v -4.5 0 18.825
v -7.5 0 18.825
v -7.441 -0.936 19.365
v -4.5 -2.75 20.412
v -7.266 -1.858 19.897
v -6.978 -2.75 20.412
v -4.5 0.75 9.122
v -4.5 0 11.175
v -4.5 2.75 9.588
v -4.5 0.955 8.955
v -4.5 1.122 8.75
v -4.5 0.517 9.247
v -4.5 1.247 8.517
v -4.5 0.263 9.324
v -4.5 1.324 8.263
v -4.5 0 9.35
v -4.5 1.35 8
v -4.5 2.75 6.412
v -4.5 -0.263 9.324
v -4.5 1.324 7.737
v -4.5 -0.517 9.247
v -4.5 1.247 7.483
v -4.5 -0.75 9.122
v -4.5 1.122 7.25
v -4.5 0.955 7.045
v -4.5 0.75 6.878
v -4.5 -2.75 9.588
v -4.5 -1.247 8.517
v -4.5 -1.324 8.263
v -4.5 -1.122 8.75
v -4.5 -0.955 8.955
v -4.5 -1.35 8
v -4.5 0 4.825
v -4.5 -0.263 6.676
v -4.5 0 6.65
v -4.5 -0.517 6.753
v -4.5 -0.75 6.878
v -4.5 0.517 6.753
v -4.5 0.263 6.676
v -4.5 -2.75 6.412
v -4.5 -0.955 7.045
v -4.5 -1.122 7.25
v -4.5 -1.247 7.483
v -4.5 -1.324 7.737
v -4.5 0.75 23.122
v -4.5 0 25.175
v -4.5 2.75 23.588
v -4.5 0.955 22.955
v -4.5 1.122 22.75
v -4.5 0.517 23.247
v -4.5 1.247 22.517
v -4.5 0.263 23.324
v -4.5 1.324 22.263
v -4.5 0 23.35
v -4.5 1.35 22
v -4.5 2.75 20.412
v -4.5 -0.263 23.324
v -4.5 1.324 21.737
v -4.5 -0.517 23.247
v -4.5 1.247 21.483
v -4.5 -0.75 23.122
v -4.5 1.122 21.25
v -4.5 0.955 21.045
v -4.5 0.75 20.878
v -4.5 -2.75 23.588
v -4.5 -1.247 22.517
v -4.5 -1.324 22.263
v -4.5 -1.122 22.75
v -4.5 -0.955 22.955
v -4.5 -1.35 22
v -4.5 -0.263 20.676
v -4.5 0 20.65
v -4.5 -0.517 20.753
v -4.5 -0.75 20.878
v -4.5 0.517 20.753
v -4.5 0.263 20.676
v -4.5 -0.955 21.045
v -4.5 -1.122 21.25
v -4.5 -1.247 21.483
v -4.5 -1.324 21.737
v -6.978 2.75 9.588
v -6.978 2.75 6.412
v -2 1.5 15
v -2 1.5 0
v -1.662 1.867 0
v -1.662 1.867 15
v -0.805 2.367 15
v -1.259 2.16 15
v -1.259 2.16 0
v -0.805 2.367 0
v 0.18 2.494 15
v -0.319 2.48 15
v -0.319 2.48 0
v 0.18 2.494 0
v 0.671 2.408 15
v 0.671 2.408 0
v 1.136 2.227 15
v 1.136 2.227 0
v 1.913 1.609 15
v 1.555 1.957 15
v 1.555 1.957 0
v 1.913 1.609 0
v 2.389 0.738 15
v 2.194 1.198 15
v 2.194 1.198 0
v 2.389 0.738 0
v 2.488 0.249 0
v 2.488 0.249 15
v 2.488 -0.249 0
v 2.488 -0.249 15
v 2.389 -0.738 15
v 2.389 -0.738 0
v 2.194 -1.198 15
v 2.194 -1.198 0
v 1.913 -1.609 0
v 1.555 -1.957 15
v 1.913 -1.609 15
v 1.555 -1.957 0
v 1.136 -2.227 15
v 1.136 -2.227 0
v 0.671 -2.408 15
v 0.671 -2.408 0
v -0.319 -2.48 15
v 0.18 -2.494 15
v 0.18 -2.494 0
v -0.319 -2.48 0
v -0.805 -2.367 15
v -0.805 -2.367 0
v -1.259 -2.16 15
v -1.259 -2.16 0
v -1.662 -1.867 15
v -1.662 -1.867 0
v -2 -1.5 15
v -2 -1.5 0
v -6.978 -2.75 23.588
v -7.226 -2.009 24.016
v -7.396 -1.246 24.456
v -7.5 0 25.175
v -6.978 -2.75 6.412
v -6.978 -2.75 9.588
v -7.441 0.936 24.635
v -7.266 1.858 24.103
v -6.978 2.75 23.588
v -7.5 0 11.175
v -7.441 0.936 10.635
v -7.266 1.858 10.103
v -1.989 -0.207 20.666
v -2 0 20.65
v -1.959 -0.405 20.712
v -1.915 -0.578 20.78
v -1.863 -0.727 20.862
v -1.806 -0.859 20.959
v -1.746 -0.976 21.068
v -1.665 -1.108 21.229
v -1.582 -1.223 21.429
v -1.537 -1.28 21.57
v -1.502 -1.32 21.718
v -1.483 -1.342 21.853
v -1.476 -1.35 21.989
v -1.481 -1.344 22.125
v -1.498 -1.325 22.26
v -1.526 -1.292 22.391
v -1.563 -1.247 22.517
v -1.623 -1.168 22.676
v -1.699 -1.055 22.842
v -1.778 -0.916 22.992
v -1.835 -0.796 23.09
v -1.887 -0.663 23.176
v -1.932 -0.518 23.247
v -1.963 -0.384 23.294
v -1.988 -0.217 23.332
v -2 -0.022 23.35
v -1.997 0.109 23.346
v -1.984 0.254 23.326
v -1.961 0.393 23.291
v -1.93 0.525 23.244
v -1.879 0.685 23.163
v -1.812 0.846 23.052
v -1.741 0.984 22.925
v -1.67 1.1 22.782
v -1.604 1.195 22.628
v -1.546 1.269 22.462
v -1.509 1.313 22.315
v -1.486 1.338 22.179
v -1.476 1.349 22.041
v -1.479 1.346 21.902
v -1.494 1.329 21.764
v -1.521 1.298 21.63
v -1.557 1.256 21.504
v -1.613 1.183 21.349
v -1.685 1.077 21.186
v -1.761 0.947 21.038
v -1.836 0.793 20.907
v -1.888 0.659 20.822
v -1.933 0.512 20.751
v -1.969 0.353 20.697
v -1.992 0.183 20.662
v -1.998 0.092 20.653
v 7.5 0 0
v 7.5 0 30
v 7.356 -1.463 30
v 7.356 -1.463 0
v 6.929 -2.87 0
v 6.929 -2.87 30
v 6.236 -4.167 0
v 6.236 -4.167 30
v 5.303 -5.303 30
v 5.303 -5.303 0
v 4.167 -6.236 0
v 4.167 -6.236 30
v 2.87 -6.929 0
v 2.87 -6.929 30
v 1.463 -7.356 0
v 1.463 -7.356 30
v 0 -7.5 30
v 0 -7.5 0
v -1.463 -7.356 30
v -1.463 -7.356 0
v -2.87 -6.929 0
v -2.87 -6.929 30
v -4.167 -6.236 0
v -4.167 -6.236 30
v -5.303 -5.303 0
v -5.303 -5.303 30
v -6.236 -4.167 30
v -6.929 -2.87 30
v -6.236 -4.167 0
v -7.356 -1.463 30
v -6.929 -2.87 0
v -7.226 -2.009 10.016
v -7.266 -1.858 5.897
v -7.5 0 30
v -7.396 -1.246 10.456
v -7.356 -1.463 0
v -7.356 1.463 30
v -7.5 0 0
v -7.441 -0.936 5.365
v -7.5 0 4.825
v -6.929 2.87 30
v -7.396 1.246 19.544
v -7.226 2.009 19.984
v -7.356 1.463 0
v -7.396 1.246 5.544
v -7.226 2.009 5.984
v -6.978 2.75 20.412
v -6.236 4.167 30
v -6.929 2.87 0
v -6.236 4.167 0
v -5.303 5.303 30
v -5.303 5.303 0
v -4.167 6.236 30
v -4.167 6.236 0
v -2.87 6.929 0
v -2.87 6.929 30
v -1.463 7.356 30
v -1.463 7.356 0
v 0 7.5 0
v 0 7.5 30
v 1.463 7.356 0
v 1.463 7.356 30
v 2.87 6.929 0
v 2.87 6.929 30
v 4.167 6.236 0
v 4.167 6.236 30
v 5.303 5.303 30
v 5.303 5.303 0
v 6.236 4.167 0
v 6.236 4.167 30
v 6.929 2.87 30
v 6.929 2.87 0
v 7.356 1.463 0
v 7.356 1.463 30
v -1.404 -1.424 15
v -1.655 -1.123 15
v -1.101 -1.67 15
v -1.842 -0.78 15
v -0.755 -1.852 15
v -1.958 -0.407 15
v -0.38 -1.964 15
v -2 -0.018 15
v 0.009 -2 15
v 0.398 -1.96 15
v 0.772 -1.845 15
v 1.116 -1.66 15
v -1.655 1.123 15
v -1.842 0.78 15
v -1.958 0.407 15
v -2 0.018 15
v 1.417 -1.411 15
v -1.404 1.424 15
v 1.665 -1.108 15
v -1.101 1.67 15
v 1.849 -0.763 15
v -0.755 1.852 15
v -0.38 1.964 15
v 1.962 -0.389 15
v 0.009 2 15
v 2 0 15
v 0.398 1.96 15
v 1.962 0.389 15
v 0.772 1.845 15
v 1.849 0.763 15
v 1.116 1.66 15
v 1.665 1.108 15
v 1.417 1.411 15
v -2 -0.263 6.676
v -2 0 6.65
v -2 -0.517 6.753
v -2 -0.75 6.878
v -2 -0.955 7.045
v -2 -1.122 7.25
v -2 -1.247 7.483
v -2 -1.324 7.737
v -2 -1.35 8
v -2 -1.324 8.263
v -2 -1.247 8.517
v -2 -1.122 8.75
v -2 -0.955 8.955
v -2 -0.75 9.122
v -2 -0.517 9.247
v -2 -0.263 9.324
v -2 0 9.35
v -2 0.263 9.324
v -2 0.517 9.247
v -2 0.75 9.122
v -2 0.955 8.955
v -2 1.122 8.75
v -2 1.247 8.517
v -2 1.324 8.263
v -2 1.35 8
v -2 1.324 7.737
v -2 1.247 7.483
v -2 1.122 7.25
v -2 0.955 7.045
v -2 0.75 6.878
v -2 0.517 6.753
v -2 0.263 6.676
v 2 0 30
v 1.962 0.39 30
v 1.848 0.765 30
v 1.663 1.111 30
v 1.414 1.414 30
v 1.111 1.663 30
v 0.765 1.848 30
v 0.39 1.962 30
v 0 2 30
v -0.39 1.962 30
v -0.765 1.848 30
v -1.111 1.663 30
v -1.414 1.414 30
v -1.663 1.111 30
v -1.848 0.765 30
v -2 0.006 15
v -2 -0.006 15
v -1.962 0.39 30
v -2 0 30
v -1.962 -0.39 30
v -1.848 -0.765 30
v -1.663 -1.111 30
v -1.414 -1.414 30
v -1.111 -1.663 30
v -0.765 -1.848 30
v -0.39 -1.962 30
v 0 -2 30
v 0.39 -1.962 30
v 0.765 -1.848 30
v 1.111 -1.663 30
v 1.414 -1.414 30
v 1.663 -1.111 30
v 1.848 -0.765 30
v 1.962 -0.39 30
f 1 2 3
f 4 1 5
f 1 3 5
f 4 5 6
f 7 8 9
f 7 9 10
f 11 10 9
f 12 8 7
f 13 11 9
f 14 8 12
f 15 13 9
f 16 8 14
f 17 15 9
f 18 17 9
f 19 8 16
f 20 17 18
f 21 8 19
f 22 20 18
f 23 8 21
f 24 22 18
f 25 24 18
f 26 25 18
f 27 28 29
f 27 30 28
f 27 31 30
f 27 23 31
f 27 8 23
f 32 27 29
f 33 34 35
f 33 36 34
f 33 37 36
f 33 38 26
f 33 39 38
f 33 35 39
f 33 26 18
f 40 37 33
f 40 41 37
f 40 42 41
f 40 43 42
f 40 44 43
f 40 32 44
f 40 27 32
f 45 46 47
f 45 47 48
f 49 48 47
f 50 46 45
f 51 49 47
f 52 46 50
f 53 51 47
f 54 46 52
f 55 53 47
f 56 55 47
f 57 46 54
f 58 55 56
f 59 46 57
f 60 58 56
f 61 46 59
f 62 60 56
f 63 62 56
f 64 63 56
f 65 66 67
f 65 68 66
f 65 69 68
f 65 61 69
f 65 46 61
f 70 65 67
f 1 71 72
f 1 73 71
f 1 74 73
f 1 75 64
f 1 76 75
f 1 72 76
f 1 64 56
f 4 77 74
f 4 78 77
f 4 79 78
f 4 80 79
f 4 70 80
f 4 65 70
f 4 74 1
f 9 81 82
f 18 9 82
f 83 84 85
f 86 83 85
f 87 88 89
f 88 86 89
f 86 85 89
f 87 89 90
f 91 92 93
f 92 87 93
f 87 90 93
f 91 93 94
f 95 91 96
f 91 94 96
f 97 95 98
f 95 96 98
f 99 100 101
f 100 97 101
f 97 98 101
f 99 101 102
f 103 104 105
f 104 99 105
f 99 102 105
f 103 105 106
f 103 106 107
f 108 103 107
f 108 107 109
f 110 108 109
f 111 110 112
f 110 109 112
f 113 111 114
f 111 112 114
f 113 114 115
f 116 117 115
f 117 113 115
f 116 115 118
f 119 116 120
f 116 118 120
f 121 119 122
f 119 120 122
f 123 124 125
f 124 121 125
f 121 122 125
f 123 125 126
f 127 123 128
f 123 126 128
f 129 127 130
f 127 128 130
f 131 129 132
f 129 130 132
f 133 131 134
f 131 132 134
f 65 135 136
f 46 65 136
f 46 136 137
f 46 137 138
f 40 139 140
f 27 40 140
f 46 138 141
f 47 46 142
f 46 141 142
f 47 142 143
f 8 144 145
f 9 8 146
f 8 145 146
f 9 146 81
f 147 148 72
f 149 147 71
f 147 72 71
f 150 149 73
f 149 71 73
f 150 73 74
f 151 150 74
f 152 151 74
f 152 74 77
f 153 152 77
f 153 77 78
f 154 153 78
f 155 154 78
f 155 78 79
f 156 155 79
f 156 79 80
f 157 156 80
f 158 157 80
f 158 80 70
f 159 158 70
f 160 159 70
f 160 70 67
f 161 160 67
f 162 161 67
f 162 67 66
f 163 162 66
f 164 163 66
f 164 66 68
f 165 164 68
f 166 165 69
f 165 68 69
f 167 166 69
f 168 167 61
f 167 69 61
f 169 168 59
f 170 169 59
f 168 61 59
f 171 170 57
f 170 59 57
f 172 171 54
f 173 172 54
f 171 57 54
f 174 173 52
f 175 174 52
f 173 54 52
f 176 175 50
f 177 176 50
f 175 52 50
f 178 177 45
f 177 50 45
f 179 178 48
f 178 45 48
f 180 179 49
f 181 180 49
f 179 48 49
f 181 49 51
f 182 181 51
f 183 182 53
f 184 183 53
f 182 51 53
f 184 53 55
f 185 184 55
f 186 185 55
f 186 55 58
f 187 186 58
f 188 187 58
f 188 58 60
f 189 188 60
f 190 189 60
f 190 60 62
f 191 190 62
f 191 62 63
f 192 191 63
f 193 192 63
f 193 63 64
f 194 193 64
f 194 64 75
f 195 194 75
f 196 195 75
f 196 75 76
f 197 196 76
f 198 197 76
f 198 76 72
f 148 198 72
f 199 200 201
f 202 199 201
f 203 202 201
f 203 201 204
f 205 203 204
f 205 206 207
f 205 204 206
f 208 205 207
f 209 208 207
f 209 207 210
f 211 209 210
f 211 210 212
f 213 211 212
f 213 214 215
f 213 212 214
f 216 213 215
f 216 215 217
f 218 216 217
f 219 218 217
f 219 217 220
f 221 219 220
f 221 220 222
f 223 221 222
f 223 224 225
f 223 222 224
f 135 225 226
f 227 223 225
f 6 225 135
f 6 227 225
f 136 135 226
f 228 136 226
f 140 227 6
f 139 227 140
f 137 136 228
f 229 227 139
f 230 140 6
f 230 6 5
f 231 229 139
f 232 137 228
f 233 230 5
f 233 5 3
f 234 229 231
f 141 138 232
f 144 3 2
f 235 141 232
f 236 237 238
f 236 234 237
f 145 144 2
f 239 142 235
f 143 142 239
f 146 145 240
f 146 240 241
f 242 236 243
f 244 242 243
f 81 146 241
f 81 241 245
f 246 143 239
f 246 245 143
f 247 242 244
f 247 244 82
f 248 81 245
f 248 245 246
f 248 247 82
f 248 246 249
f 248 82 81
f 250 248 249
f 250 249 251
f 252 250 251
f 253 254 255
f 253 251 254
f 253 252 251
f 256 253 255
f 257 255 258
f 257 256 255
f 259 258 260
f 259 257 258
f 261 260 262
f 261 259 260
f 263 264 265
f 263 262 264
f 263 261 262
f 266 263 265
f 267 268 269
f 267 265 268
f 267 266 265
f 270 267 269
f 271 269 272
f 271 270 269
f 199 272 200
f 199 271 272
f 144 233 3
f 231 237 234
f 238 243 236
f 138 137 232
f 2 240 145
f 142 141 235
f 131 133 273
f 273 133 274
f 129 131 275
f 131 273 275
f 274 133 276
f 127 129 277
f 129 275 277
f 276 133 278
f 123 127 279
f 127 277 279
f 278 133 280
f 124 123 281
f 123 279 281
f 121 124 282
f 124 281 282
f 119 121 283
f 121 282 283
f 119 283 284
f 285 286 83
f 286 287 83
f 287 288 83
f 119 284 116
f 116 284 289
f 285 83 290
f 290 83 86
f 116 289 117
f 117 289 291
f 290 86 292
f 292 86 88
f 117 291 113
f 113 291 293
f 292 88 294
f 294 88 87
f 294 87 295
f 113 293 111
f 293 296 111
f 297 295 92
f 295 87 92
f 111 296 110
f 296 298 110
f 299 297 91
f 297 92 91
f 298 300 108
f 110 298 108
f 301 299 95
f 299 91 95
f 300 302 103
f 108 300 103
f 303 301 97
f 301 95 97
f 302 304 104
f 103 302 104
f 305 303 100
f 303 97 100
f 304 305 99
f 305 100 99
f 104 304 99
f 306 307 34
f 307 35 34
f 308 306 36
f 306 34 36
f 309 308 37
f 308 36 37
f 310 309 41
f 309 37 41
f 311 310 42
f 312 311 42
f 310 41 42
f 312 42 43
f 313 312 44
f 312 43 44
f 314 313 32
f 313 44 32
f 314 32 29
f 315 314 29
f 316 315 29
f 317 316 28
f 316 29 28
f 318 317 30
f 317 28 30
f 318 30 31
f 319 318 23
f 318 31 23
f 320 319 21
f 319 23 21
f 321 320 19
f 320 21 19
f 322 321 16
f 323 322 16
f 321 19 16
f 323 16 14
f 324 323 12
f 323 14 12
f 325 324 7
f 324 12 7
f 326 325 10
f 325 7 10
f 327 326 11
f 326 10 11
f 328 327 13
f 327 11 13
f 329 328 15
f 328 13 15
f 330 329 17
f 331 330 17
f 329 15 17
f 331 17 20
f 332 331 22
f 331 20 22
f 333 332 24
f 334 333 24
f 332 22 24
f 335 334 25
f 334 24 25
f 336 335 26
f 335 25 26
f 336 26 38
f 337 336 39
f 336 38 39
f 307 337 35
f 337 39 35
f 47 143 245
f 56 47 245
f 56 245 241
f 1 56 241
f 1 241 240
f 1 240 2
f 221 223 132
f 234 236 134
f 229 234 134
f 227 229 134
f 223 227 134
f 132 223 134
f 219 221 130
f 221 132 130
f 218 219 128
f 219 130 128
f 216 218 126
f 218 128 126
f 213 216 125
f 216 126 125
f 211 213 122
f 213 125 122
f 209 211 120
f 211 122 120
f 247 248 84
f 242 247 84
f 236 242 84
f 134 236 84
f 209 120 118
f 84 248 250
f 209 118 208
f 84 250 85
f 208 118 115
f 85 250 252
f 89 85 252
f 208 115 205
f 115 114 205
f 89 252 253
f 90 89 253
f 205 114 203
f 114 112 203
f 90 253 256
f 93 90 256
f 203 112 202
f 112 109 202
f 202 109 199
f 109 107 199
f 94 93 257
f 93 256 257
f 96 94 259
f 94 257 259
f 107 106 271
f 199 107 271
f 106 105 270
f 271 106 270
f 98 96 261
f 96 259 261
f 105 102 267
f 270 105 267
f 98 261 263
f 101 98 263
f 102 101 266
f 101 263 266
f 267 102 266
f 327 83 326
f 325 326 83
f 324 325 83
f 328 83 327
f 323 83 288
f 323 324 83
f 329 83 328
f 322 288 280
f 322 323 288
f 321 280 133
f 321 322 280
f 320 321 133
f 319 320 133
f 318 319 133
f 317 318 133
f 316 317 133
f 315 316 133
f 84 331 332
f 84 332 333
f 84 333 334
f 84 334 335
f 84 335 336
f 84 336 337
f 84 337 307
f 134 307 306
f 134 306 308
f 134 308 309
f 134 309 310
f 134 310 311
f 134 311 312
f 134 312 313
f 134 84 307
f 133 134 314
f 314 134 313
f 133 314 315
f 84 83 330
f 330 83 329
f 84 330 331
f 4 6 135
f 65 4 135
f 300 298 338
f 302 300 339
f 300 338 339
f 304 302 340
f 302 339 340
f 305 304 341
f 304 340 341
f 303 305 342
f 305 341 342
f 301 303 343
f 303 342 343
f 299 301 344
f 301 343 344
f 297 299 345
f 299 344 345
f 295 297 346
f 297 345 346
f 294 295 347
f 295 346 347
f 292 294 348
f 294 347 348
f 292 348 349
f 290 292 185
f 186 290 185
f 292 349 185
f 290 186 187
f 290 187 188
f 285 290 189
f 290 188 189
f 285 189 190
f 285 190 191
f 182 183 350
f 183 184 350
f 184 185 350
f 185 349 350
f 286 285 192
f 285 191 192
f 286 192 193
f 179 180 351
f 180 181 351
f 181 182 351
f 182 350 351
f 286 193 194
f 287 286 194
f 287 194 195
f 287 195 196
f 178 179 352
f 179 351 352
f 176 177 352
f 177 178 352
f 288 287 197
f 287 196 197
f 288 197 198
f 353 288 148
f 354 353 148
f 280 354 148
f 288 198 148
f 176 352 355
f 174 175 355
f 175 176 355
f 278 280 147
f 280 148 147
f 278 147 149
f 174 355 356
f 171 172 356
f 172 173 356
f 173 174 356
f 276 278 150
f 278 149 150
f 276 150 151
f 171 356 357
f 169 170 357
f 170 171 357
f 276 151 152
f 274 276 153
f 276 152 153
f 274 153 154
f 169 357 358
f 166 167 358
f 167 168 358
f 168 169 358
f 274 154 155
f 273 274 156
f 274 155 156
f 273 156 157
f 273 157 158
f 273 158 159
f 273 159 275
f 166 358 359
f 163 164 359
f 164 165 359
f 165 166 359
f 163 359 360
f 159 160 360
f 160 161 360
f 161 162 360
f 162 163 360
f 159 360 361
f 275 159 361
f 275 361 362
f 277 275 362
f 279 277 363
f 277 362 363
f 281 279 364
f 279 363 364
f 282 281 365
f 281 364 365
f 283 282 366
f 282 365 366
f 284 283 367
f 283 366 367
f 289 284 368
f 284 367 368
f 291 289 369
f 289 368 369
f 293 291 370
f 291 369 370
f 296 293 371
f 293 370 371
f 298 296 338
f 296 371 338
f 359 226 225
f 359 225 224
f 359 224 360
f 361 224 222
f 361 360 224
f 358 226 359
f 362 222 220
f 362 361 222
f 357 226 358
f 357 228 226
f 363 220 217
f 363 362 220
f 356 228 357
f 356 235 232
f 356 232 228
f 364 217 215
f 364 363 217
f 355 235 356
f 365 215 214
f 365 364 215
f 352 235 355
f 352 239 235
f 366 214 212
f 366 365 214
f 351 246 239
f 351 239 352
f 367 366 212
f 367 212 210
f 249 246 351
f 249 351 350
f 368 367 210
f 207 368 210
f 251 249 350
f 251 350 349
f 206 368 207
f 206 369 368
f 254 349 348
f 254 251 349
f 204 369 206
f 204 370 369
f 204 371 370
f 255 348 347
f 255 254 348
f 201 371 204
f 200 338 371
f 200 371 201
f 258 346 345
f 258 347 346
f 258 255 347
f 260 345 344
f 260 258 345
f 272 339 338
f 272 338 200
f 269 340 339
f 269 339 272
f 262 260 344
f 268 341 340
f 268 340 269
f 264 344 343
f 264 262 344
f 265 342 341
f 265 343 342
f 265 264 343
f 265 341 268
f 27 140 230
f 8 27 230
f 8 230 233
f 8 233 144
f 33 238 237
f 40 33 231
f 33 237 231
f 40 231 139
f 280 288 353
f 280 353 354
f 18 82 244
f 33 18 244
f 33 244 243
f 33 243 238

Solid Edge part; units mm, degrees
sketch "Sketch1" plane through (0, 0, 0) normal (0, 0, 1) x (1, 0, 0)
  circle A0 centre (0, 0) radius 7.5
  dimension "D1" = 15
extrude "Protrusion1" add sketch "Sketch1" along normal blind 30
sketch "Sketch2" plane through (0, 0, 30) normal (0, 0, 1) x (1, 0, 0)
  circle A0 centre (0, 0) radius 2
extrude "ExtrudedCutout_1" cut sketch "Sketch2" against normal blind 15
sketch "Sketch3" plane through (0, 0, 0) normal (0, 0, -1) x (1, 0, 0)
  line L0 (-1.9999, -1.5001) -> (-1.9999, 1.5001)
  arc A0 (-1.9999, 1.5001) -> (-1.9999, -1.5001) centre (0, 0) cw
extrude "Cutout1" cut sketch "Sketch3" against normal up to vertex (15 mm away)
sketch "Sketch4" plane through (-7.5, 0, 15) normal (-1, 0, 0) x (0, 0, -1)
  line L0 (5.4123, 2.75) -> (3.8246, 0)
  line L1 (3.8246, 0) -> (5.4123, -2.75)
  line L2 (5.4123, -2.75) -> (8.5877, -2.75)
  line L3 (8.5877, -2.75) -> (10.1754, 0)
  line L4 (10.1754, 0) -> (8.5877, 2.75)
  line L5 (8.5877, 2.75) -> (5.4123, 2.75)
  line L6 (-8.5877, 2.75) -> (-10.1754, 0)
  line L7 (-10.1754, 0) -> (-8.5877, -2.75)
  line L8 (-8.5877, -2.75) -> (-5.4123, -2.75)
  line L9 (-5.4123, -2.75) -> (-3.8246, 0)
  line L10 (-3.8246, 0) -> (-5.4123, 2.75)
  line L11 (-5.4123, 2.75) -> (-8.5877, 2.75)
extrude "ExtrudedCutout_3" cut sketch "Sketch4" against normal blind 3
sketch "Sketch5" plane through (-7.5, 0, 15) normal (-1, 0, 0) x (0, 0, -1)
  circle A0 centre (-7, 0) radius 1.35
  circle A1 centre (7, 0) radius 1.35
  dimension "D1" = 2.7
  dimension "D2" = 2.7
extrude "Cutout2" cut sketch "Sketch5" against normal up to next
